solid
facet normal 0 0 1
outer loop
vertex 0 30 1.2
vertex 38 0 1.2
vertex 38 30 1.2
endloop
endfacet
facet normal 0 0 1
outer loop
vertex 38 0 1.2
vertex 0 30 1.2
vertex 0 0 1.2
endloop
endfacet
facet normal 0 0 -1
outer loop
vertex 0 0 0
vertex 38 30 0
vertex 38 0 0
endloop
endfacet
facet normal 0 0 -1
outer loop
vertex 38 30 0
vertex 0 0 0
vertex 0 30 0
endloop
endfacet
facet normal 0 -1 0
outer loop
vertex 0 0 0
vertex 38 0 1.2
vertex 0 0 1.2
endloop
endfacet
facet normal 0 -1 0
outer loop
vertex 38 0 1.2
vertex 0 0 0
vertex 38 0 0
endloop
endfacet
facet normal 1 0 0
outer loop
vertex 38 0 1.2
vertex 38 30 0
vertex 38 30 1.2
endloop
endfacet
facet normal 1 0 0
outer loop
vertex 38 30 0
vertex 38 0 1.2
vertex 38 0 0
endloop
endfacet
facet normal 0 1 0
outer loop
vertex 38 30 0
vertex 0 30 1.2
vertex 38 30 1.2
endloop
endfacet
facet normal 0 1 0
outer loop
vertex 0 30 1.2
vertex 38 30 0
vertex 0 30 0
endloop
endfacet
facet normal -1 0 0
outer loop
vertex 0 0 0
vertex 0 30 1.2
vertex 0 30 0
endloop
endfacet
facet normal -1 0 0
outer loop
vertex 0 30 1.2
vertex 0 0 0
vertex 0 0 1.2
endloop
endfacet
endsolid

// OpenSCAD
// file: config.scad
$fn = $preview ? 32 : 128;
thread_fn = $preview ? 16 : 128;

blower_inner_radius = 41.7 / 2;
blower_lip_width = 9.5;
blower_lip_depth = 2.5;
blower_inset_depth = 2.5;
blower_inset_radius = 34 / 2;
blower_lip_thickness = 2;
blower_middle_depth = 2.5;
blower_outer_radius = 49 / 2;
blower_upper_depth = 5;

slide_length = 38;
slide_height = 30;
slide_thickness = 1.2;
slide_mount_wall_thickness = slide_thickness * 2.8;
slide_mount_width = slide_length + slide_mount_wall_thickness;
clip_depth = 1;
flue_slit_length = slide_mount_width * 0.8;
flue_taper_into_slit = 20; 
flue_floor_thickness = slide_mount_wall_thickness;
flue_slit_depth = 1;
flue_slit_offset = 5;

window_post_width = 2;
window_post_height = slide_height + clip_depth;

thread_size = "M42";
thread_turns = 2;
thread_pitch = 4.5;
// main file
include <config.scad>

module slide() {
    cube([slide_length, slide_height, slide_thickness]);
}

slide();
